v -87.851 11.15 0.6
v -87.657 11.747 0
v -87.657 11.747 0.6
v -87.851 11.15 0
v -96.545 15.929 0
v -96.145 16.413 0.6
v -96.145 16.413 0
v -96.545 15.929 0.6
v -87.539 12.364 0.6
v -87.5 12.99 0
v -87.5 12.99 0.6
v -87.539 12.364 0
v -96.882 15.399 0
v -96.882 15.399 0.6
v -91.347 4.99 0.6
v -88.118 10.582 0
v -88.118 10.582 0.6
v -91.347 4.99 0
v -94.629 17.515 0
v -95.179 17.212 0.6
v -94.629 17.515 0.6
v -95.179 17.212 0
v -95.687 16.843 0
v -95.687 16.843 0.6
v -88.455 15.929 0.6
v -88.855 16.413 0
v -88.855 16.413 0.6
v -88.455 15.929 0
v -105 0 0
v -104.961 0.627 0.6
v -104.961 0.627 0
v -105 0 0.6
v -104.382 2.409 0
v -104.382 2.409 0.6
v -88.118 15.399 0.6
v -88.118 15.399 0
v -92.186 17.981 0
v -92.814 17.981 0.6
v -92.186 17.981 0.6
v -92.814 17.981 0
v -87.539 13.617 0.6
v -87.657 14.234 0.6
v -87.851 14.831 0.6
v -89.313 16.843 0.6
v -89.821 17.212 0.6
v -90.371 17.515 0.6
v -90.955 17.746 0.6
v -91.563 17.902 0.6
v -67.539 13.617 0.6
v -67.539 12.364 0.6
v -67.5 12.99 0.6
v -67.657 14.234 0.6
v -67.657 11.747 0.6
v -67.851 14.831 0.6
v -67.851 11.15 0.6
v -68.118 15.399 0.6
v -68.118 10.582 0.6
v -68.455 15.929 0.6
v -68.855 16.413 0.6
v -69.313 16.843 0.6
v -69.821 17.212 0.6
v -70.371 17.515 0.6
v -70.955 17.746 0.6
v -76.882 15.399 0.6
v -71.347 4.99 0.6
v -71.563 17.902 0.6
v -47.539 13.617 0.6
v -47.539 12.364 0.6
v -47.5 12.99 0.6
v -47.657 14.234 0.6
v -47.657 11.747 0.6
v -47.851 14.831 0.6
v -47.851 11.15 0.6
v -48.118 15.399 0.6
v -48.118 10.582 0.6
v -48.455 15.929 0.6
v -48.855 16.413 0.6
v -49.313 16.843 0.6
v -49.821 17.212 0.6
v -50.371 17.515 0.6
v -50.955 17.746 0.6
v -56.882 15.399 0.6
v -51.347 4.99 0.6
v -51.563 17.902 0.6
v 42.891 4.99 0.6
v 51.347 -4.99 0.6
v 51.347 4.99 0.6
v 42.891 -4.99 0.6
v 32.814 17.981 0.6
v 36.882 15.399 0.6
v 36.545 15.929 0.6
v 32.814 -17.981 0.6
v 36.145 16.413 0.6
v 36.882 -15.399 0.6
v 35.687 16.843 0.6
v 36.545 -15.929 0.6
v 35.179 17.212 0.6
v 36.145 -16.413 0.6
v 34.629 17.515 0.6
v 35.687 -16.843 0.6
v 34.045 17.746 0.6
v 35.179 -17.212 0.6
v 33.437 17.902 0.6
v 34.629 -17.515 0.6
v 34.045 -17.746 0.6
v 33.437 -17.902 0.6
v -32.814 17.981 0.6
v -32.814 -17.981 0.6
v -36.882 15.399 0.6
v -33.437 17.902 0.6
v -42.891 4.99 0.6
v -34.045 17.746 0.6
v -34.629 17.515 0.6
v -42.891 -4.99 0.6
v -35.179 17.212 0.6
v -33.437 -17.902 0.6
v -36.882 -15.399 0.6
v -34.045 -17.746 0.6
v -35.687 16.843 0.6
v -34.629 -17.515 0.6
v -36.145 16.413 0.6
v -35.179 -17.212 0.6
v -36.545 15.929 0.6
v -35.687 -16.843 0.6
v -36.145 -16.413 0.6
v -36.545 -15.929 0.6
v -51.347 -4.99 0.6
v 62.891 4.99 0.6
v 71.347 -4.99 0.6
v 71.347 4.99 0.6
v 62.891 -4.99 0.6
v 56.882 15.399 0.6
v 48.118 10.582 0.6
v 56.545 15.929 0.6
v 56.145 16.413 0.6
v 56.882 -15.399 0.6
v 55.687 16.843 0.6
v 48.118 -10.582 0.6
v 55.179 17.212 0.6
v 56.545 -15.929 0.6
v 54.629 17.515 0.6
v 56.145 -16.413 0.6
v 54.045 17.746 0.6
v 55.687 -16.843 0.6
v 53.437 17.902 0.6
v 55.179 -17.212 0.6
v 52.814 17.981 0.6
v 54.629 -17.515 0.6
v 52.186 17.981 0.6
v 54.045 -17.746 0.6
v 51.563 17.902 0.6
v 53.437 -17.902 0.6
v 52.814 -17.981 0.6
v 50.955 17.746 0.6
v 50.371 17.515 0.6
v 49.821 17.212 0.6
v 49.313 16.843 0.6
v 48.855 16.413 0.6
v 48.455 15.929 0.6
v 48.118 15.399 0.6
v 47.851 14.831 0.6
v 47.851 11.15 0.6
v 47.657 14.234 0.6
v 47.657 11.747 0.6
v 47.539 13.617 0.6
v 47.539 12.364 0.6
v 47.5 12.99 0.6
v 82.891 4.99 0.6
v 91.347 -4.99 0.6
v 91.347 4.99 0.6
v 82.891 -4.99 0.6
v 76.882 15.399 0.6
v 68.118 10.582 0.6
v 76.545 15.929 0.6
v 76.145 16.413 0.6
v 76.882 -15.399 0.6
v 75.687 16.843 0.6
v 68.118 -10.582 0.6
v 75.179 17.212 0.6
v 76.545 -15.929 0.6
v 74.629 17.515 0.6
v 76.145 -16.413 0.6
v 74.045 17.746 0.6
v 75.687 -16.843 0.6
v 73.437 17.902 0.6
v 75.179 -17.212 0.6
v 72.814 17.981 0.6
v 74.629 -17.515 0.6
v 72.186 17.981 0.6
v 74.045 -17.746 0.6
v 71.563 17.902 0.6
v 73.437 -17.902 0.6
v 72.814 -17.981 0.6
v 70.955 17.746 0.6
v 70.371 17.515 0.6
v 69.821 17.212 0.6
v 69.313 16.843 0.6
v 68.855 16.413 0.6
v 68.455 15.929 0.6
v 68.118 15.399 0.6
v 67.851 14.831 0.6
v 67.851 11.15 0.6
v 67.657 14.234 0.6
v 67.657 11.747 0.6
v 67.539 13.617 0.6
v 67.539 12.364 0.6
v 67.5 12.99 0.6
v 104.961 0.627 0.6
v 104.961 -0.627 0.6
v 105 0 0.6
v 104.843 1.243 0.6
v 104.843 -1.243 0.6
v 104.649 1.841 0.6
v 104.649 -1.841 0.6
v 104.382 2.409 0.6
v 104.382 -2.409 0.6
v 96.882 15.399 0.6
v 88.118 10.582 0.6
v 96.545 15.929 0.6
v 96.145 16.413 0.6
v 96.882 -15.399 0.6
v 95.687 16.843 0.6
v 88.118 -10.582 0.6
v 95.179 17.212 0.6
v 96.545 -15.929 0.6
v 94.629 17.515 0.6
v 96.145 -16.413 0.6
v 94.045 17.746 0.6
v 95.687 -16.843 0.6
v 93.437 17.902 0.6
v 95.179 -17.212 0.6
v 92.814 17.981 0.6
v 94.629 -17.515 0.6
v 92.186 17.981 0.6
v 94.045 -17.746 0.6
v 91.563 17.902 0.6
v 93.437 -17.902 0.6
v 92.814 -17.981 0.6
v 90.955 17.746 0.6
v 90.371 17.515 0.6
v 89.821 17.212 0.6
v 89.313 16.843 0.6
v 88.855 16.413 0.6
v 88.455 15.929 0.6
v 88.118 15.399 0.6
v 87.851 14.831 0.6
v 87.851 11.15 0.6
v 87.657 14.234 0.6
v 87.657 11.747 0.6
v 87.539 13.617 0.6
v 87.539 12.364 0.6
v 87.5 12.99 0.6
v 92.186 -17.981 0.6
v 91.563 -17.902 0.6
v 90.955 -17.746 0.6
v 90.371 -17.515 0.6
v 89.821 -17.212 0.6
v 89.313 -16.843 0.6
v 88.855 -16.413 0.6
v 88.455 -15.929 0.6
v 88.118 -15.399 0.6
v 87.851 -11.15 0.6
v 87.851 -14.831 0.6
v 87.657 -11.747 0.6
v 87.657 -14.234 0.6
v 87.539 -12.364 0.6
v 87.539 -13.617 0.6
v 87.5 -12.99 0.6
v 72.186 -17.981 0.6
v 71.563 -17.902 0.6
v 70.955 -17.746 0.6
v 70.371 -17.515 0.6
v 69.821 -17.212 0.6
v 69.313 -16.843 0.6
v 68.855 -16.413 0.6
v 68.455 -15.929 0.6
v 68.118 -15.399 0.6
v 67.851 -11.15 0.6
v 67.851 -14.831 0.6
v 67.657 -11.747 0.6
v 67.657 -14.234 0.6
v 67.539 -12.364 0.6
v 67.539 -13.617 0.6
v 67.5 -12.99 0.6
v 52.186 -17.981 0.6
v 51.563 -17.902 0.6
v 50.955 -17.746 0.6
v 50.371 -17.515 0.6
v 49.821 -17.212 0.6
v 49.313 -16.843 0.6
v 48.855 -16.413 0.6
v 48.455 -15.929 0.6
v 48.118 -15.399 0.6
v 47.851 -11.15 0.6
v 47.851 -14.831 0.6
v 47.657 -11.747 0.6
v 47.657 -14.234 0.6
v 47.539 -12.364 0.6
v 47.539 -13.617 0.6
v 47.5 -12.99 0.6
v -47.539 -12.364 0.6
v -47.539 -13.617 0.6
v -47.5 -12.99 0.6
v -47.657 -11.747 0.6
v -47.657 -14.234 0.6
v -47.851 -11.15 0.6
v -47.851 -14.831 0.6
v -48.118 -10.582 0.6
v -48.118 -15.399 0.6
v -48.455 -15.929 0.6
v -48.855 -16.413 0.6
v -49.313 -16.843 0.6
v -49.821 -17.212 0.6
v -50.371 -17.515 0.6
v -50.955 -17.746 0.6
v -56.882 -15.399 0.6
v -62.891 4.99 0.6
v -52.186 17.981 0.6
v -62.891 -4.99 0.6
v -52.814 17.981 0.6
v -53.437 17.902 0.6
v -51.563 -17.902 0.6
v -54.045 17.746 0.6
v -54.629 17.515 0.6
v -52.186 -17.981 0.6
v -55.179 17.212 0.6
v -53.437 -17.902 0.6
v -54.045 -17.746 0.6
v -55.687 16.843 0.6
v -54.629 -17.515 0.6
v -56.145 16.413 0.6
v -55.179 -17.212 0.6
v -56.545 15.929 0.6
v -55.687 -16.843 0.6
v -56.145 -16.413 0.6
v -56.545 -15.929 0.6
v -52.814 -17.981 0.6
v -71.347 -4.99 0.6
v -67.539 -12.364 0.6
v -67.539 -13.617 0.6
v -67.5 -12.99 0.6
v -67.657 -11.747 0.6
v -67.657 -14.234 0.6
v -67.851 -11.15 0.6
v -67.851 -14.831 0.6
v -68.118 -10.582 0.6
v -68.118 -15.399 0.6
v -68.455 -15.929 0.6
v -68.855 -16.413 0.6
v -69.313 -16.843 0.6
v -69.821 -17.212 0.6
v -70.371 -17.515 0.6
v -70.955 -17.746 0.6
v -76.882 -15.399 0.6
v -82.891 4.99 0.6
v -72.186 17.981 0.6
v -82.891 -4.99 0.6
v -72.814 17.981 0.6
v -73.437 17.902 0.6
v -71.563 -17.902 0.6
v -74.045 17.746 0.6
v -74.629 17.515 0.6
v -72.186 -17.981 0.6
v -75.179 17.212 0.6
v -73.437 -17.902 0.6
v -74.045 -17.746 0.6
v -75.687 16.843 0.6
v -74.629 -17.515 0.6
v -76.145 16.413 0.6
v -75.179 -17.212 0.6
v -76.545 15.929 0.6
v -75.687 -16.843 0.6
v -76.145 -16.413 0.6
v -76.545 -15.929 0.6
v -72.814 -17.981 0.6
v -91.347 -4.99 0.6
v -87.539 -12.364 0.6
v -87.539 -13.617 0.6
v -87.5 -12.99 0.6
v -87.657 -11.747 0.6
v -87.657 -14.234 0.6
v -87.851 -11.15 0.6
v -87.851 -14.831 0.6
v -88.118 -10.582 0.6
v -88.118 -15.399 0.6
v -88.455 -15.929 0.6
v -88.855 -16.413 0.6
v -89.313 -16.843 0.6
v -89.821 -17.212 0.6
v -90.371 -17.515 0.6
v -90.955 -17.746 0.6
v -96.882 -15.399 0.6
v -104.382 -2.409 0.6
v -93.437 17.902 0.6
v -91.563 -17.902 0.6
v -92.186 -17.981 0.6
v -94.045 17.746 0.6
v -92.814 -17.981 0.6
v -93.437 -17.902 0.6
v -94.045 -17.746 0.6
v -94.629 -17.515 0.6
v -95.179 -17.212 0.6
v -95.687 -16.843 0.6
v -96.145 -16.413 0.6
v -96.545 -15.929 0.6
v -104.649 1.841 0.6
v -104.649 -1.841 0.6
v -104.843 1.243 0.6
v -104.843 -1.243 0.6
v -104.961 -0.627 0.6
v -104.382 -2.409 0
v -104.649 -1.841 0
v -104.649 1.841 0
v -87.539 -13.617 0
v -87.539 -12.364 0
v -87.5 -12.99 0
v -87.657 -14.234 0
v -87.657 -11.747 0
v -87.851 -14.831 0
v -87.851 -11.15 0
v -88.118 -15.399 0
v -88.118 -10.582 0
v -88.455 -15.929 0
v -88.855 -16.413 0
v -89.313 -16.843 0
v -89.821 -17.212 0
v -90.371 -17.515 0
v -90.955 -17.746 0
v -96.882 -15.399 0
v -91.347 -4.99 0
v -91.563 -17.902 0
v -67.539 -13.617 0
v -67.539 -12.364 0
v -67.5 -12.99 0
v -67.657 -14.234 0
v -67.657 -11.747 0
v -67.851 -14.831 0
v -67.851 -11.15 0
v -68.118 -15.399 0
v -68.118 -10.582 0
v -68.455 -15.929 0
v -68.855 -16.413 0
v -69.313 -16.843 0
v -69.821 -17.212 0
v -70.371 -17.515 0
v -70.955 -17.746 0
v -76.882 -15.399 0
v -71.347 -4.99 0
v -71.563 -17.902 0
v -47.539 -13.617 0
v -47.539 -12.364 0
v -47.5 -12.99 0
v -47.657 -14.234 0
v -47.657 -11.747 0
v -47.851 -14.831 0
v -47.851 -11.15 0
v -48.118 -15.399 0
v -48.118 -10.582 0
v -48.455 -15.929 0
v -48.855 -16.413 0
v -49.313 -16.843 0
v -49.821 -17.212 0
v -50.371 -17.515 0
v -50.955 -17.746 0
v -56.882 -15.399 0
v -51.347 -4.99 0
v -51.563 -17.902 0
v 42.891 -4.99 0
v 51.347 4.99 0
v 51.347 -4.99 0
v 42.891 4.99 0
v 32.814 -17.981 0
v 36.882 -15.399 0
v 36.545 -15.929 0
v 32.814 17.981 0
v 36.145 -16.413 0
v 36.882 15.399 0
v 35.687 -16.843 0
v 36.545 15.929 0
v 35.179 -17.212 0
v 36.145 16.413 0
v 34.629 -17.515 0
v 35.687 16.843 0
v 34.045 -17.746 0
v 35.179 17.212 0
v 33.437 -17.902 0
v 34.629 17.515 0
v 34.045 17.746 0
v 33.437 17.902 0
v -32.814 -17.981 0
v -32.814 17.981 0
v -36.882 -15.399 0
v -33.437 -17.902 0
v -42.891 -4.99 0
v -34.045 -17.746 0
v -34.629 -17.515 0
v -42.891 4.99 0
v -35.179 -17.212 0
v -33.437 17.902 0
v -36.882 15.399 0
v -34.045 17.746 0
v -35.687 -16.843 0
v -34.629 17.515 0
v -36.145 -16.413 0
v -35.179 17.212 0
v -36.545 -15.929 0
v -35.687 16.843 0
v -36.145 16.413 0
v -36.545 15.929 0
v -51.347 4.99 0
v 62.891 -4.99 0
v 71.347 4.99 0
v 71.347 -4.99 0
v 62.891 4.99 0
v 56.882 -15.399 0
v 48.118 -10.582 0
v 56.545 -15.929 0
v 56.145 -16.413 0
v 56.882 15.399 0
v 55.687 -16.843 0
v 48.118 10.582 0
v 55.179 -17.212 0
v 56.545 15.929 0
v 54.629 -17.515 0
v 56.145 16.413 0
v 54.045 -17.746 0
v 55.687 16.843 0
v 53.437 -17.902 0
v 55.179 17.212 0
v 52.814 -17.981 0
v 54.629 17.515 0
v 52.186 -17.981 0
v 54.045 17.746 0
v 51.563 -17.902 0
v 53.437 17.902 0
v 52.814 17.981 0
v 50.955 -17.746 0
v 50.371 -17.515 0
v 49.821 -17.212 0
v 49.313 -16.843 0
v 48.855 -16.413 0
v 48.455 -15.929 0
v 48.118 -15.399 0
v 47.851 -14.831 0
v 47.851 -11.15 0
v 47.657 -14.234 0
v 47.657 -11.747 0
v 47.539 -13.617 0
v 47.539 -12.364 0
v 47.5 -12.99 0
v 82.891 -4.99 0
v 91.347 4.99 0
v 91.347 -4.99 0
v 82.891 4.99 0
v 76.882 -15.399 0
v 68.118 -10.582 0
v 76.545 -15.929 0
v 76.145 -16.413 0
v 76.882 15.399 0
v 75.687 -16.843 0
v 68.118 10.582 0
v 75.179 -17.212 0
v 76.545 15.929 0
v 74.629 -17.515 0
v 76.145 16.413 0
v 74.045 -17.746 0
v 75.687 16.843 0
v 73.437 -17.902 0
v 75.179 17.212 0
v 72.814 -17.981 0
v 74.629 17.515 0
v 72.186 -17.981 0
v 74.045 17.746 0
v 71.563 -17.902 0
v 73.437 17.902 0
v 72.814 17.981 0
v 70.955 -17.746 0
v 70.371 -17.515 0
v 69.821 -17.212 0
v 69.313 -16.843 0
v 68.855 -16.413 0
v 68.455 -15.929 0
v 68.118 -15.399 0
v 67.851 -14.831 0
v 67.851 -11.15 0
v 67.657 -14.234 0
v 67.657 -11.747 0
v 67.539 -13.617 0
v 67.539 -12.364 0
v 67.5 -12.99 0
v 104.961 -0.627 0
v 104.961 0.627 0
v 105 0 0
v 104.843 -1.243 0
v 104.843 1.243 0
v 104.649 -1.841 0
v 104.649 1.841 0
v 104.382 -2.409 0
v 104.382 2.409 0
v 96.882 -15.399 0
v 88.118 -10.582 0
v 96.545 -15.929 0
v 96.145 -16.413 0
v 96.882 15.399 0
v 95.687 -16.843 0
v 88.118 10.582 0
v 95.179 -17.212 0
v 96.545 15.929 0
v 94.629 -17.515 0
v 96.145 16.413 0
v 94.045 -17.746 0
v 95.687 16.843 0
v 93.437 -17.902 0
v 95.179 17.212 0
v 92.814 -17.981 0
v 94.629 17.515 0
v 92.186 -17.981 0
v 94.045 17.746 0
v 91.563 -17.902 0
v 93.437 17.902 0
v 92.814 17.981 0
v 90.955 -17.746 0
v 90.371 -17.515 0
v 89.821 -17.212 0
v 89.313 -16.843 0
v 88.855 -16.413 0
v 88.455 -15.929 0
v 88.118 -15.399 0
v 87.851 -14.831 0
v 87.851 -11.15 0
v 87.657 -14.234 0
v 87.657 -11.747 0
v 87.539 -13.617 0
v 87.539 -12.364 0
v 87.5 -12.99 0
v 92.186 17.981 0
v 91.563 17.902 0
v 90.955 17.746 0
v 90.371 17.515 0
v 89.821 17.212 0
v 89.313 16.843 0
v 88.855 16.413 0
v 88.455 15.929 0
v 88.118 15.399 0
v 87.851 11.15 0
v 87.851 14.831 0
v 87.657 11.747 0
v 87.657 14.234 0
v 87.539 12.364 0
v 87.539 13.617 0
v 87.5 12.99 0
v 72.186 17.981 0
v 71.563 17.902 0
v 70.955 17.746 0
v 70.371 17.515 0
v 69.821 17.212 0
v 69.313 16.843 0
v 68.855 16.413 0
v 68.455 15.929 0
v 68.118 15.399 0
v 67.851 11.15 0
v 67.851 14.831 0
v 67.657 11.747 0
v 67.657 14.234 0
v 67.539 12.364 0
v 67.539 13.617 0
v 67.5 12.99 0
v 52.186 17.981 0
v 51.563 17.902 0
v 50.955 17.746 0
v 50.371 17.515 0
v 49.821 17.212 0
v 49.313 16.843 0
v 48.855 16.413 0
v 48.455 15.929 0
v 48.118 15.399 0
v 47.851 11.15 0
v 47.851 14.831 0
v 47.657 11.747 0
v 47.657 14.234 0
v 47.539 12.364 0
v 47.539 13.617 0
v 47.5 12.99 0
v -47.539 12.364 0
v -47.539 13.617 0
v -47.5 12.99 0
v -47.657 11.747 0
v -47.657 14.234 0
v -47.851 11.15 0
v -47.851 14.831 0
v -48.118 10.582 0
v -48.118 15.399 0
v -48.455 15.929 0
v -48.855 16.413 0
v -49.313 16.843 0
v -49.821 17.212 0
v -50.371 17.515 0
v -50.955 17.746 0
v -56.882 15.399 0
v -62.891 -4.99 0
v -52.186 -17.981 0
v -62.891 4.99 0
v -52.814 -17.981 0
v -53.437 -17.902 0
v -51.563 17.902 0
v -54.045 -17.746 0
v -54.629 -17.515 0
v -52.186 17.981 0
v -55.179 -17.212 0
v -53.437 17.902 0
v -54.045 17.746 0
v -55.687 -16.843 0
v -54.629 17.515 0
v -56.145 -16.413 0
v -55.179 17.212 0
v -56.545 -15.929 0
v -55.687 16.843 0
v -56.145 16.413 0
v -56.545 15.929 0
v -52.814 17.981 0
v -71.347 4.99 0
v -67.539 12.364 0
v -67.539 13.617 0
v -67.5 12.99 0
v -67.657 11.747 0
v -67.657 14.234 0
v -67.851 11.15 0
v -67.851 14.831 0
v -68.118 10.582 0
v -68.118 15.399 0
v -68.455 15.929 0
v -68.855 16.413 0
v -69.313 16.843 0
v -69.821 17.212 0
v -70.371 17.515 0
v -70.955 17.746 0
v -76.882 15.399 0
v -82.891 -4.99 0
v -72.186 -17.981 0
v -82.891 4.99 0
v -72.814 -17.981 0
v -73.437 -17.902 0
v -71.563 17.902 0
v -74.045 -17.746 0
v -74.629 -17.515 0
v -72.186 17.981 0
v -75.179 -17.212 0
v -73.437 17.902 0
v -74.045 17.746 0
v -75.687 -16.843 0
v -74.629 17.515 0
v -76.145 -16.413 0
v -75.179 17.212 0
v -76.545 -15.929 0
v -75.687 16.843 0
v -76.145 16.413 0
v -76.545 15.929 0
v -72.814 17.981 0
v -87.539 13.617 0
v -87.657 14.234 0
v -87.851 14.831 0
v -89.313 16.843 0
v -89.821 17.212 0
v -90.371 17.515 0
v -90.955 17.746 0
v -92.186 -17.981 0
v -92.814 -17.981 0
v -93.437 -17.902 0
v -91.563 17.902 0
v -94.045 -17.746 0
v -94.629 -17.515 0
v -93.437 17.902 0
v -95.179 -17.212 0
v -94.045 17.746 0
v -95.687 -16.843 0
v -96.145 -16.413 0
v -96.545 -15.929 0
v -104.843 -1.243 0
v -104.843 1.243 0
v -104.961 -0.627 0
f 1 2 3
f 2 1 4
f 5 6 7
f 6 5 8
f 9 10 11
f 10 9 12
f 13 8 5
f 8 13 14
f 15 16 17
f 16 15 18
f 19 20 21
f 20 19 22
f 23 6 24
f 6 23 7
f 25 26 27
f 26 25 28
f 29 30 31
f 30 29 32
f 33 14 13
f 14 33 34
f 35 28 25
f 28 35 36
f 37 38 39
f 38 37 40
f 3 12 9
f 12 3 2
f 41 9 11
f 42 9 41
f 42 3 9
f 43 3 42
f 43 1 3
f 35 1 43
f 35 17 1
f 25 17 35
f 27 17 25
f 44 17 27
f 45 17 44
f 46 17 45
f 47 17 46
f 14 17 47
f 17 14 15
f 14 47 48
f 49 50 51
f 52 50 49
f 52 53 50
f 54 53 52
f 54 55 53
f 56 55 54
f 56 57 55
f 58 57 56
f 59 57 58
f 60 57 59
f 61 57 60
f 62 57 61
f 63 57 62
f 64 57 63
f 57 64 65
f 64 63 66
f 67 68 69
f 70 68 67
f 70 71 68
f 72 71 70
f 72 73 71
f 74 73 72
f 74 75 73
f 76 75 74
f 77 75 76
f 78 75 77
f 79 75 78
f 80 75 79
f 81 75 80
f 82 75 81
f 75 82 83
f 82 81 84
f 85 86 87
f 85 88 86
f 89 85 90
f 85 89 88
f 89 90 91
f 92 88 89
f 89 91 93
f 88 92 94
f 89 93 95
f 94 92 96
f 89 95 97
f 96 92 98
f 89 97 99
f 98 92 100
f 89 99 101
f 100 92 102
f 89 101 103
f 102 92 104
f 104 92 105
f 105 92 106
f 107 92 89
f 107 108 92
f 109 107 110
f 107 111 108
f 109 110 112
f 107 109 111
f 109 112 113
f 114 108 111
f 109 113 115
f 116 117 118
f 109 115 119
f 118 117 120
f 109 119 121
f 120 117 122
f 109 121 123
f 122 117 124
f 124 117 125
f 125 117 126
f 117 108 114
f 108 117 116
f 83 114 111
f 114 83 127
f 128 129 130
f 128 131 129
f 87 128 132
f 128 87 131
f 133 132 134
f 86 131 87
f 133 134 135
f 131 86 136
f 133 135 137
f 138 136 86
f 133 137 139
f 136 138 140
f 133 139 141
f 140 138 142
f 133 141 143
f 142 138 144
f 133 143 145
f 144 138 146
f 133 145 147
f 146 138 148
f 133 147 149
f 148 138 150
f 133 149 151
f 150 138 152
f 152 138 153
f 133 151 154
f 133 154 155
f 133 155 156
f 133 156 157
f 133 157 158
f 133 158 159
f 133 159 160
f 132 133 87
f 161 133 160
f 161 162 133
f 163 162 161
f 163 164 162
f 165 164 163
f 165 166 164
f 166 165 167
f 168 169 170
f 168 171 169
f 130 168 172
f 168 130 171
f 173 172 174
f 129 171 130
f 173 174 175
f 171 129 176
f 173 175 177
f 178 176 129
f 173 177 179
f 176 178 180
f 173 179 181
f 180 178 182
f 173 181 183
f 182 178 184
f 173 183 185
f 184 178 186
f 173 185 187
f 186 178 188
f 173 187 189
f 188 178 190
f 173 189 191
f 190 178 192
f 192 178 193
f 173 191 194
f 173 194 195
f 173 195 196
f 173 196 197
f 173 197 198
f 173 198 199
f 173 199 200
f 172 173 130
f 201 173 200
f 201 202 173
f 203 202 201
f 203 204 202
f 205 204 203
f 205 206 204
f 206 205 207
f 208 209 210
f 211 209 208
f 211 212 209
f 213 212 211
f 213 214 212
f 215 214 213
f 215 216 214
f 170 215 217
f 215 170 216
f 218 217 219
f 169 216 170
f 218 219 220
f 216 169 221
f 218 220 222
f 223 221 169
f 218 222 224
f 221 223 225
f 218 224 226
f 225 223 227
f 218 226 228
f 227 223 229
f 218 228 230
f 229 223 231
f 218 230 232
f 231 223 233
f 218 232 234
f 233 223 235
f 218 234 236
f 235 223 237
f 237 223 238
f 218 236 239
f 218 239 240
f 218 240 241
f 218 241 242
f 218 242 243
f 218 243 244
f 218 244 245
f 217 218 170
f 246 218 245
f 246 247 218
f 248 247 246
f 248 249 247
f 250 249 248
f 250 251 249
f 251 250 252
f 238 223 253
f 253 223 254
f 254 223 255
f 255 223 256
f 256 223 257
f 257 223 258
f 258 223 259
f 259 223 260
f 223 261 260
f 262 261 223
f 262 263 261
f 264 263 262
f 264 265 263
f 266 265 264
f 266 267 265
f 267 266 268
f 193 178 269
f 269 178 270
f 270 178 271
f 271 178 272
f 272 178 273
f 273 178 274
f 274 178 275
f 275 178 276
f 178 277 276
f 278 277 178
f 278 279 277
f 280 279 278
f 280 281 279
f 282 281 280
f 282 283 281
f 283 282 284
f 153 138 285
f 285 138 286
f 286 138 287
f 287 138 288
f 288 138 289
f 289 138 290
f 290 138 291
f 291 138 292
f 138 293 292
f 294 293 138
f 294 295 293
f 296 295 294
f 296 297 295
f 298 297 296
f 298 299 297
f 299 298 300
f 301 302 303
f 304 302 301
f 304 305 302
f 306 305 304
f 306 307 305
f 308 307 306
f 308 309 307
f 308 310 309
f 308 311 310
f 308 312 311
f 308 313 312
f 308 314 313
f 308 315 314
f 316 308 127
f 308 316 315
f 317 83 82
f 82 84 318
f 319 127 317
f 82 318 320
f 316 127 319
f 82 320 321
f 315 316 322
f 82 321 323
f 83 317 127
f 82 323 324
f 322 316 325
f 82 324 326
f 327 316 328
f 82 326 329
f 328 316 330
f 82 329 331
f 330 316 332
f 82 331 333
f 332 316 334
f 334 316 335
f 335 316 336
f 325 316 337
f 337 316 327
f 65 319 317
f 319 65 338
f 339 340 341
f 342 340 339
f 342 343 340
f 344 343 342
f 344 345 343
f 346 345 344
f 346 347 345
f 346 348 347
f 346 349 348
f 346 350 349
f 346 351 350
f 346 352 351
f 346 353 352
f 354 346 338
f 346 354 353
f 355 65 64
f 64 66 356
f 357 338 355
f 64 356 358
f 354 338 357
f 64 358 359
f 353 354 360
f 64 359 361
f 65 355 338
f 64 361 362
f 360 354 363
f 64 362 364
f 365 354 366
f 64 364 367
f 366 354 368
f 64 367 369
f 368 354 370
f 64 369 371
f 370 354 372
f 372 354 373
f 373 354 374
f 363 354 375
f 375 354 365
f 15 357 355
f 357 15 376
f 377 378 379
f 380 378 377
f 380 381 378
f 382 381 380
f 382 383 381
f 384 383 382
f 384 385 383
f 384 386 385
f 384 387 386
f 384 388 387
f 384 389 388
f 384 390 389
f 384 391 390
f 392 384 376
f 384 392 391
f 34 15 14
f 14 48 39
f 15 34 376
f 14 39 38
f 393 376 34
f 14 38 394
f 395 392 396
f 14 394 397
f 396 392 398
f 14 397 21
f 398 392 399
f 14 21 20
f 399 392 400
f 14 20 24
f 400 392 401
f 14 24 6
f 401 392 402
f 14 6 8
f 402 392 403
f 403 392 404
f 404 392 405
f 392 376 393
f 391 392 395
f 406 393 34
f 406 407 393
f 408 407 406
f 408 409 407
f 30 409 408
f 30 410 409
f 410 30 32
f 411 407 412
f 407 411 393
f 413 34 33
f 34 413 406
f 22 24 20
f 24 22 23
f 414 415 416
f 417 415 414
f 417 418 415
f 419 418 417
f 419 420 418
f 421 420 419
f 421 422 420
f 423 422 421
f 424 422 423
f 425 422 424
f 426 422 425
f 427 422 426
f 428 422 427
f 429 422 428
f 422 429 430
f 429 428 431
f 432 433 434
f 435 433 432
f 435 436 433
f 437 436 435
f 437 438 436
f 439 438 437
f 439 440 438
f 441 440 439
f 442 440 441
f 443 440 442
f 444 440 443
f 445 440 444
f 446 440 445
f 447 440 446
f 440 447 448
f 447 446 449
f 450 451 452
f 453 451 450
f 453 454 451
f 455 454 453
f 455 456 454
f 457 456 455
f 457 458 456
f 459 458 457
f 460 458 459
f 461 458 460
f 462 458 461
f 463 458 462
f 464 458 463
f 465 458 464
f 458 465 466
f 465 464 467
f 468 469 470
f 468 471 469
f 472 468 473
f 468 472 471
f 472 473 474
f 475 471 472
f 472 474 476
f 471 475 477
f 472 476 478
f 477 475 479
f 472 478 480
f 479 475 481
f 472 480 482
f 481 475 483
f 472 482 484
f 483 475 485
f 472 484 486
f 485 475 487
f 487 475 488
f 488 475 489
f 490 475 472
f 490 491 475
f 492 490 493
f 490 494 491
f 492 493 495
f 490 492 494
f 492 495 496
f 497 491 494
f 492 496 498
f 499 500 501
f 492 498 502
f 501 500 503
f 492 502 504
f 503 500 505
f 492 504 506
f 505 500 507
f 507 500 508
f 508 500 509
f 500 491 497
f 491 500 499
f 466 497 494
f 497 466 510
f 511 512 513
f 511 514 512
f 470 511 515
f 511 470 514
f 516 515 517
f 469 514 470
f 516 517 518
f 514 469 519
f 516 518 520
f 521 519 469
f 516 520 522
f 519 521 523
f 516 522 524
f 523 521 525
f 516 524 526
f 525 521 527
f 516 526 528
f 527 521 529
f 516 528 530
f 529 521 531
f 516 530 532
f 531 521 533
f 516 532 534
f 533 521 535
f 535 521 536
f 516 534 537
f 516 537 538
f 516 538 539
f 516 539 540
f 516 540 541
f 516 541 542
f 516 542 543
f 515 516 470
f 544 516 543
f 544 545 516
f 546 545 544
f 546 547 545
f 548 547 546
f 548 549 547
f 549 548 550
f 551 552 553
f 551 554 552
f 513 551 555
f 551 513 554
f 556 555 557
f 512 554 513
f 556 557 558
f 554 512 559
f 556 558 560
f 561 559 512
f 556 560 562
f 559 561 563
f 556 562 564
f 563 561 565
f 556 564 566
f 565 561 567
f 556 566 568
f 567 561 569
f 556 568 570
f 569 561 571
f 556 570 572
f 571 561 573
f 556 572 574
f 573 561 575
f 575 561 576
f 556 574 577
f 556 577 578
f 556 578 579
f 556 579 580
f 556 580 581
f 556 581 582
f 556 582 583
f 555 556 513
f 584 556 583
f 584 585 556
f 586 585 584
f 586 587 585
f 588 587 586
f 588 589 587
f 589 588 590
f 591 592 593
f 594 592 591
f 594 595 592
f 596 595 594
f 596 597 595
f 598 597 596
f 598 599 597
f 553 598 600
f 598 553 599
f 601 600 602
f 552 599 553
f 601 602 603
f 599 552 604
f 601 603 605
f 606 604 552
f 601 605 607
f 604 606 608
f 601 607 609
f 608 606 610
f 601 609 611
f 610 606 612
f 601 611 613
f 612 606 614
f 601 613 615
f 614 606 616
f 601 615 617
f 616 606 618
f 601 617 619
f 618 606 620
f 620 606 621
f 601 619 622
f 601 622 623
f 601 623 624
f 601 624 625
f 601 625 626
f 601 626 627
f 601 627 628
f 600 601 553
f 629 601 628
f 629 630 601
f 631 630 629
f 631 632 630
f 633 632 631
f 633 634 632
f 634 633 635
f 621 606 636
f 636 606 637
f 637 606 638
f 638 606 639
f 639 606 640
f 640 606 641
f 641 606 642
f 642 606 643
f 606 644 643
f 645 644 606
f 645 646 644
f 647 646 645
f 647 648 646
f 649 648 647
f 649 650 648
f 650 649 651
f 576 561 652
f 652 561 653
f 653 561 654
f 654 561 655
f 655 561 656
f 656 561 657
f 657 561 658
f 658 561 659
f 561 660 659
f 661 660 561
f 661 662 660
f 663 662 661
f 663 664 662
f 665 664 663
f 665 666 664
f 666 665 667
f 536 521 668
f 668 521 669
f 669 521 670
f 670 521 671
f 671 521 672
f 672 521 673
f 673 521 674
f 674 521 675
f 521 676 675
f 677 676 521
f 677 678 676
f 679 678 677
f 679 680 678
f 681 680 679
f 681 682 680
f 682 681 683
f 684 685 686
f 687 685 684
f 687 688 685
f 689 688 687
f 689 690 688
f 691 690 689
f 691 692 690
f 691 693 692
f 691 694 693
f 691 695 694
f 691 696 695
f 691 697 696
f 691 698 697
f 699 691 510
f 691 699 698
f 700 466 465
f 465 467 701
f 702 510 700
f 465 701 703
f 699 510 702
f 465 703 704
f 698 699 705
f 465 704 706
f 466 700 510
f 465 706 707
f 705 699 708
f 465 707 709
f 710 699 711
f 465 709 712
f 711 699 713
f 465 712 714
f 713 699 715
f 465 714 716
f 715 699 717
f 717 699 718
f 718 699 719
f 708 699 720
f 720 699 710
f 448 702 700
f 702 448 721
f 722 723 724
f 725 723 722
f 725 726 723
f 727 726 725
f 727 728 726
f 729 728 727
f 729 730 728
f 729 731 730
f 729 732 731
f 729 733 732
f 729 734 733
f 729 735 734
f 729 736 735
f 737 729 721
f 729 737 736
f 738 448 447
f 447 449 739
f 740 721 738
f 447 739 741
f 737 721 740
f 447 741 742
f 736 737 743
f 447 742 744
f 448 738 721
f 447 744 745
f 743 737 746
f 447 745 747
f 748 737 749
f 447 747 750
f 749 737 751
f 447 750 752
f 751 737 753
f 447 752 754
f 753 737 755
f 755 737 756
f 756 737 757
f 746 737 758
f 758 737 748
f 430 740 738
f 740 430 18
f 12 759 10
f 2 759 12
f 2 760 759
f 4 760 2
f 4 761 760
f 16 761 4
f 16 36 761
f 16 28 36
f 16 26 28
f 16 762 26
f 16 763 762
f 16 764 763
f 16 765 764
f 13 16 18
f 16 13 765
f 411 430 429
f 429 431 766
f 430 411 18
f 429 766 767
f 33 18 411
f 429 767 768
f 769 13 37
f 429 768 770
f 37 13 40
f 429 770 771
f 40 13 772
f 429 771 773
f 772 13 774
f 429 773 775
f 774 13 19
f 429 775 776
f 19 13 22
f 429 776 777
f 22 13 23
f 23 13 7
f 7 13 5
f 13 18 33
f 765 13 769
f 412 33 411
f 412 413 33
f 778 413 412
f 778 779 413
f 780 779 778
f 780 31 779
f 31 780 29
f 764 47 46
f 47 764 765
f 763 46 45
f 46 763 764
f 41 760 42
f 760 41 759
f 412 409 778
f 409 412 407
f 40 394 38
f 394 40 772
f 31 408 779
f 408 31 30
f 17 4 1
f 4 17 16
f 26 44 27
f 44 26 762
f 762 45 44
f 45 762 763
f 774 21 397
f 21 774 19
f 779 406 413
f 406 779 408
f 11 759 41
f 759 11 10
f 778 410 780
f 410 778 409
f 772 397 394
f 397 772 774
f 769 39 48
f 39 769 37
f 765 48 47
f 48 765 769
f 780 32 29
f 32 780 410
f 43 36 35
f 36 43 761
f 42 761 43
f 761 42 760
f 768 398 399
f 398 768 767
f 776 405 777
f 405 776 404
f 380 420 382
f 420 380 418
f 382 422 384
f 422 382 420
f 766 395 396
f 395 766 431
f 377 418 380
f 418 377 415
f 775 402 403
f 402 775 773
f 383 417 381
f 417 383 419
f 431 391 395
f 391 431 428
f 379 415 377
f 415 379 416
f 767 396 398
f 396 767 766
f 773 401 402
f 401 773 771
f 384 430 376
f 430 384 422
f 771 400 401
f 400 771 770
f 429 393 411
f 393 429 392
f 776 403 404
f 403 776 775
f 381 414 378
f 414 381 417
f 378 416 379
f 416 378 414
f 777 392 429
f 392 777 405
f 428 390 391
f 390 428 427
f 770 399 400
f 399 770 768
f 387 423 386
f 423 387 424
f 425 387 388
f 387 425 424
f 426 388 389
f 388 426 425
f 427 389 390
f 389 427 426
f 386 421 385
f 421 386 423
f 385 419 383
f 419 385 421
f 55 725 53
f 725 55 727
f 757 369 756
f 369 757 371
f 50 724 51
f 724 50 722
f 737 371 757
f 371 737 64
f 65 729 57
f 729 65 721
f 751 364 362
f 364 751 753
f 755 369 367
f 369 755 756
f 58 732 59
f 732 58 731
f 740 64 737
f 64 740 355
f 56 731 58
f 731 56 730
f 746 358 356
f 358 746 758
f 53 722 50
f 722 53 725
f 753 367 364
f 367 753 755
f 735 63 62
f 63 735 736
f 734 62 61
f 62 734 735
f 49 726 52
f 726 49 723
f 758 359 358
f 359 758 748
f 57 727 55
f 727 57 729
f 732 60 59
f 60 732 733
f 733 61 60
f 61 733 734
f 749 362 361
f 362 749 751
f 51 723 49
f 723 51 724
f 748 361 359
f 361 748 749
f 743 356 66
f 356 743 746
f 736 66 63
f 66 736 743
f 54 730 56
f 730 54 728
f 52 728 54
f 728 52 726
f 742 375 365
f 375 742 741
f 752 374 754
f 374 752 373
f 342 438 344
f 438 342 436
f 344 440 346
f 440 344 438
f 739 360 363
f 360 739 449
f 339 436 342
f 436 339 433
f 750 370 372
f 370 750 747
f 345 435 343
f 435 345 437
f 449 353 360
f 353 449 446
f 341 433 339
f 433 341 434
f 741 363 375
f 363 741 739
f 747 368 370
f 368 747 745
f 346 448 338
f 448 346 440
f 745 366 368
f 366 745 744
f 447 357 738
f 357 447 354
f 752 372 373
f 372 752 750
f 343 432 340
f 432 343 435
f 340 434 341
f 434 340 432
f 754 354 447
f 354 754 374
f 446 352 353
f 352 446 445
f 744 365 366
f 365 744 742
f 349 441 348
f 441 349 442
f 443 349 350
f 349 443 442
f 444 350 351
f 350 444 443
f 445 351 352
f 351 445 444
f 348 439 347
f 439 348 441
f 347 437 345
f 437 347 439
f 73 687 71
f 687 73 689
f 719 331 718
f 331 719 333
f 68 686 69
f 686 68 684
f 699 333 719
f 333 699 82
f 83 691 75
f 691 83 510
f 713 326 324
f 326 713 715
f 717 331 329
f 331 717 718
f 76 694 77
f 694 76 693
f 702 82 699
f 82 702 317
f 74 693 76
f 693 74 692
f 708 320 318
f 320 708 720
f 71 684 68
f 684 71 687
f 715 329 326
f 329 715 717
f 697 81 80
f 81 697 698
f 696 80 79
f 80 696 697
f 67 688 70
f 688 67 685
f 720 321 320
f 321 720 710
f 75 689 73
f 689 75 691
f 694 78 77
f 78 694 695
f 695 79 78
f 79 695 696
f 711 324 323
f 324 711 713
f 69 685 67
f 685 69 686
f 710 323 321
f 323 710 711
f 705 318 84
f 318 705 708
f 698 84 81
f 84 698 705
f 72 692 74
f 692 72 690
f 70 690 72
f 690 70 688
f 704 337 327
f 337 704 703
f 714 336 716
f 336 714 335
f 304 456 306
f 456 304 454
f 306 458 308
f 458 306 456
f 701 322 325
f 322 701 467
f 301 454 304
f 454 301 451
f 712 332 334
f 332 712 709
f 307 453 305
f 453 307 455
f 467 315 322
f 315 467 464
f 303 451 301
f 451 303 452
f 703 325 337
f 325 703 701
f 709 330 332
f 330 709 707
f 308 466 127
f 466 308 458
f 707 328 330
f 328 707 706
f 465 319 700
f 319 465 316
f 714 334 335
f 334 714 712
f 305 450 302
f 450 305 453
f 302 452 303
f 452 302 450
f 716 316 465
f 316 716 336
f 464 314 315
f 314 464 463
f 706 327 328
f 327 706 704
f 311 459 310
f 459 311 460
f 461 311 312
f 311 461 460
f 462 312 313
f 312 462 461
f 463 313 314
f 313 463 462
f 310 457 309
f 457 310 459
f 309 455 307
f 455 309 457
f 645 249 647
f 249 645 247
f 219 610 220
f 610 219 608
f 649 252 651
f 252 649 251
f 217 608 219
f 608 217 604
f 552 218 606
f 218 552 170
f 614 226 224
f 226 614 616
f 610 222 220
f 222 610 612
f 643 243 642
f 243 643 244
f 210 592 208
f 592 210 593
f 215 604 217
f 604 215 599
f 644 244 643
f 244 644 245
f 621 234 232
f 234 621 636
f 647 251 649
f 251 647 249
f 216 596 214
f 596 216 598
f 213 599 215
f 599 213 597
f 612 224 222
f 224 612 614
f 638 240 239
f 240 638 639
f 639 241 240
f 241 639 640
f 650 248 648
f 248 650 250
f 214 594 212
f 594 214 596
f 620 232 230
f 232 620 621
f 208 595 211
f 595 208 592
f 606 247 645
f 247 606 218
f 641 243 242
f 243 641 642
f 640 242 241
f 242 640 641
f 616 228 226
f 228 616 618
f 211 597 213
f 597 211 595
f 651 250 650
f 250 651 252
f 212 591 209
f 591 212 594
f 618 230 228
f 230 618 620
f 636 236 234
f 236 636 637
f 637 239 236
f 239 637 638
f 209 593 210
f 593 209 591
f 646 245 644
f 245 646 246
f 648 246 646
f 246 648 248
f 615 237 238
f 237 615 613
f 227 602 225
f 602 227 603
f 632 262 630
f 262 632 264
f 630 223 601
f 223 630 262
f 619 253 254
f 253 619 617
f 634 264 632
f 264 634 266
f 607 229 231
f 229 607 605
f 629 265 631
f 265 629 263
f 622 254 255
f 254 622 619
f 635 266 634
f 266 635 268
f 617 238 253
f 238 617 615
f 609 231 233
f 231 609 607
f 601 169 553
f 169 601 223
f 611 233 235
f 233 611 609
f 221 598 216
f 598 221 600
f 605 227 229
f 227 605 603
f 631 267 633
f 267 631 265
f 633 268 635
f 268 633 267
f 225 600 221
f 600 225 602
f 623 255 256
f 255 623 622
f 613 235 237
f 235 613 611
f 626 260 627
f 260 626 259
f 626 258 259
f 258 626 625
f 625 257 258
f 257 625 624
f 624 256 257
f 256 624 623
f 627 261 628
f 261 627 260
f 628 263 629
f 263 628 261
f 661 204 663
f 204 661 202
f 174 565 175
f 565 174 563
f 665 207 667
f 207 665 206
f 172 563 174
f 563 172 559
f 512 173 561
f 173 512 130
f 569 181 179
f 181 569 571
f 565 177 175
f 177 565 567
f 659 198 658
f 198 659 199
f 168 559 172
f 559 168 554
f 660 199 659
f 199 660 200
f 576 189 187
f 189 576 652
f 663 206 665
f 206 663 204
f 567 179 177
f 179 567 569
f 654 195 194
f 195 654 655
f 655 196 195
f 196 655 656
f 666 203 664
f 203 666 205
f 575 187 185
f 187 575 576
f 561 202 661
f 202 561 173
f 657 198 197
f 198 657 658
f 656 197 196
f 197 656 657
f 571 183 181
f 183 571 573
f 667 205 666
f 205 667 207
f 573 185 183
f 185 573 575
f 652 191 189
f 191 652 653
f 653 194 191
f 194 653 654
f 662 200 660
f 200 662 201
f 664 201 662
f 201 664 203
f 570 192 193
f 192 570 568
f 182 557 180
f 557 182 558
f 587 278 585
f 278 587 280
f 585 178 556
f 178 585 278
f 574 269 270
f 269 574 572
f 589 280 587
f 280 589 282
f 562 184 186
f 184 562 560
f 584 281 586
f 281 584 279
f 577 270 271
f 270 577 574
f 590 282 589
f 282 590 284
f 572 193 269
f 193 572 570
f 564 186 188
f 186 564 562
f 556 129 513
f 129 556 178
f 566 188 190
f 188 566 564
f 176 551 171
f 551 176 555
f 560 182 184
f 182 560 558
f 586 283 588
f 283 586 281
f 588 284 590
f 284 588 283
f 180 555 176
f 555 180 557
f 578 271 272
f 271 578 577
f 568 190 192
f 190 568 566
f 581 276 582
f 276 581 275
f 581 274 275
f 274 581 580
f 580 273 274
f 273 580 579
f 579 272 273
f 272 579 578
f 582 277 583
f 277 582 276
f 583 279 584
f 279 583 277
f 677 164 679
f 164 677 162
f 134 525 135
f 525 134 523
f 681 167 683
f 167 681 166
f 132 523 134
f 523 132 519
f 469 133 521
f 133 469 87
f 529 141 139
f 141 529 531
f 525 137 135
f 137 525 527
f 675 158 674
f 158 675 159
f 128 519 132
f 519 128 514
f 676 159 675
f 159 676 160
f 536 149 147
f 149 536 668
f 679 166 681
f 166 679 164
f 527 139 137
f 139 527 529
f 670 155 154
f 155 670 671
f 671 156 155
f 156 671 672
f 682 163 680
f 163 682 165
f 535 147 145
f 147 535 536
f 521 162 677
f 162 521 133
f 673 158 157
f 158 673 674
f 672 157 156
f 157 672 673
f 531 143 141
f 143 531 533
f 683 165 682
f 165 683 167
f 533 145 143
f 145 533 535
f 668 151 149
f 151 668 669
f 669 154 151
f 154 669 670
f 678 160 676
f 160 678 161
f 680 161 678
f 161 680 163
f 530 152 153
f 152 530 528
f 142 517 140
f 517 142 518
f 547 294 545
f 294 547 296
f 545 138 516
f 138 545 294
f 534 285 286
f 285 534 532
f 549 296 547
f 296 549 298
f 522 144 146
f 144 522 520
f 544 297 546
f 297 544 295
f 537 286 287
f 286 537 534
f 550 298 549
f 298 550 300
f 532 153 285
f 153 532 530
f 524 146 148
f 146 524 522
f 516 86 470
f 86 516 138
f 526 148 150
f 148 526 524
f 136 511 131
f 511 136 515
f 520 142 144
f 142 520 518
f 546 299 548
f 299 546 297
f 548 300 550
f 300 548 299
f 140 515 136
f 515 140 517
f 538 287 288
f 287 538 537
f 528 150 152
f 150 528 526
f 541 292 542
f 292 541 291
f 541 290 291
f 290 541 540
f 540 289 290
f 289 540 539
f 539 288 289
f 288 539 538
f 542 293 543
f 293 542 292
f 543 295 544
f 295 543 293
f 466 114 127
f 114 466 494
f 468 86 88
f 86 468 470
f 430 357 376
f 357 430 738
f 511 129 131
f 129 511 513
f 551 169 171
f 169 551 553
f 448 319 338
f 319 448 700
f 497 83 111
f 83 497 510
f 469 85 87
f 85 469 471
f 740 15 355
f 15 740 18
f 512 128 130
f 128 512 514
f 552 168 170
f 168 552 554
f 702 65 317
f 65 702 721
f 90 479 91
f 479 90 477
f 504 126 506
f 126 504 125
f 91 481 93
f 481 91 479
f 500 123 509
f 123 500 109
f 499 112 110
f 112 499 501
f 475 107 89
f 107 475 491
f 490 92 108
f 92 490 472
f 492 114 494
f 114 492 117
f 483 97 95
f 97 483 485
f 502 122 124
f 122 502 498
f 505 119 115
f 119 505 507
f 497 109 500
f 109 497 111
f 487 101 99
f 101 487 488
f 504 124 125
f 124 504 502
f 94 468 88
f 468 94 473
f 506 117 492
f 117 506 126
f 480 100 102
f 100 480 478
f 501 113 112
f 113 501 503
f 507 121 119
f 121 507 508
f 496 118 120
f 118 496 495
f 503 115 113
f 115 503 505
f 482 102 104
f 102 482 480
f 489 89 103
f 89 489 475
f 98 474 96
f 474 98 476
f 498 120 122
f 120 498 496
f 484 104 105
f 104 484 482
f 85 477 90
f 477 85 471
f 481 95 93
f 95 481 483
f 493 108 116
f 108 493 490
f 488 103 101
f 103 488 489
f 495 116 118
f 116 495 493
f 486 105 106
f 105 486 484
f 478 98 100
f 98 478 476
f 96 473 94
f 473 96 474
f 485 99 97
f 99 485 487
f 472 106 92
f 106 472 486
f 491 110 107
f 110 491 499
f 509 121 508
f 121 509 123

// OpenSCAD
/**
 * Martin Egli
 * 2021-06-23
 * a relife strip for corona masks
 */

res = 50;

module grip01(th = 0.6, wid = 15) {
    hull() {
        translate([0, 0, 0])
        cylinder(d = 10, h = th, $fn = res);
        translate([wid*cos(60), wid*sin(60), 0])
        cylinder(d = 10, h = th, $fn = res);
    }
    hull() {
        translate([0, 0, 0])
        cylinder(d = 10, h = th, $fn = res);
        translate([wid*cos(-60), wid*sin(-60), 0])
        cylinder(d = 10, h = th, $fn = res);
    }
}

module relief01(th = 0.6) {
    hull() {
        translate([-100+5, 0, 0])
        cylinder(d = 10, h = th, $fn = res);
        translate([100-5, 0, 0])
        cylinder(d = 10, h = th, $fn = res);
    }
    translate([-100, 0, 0])
    grip01(th);
    translate([-80, 0, 0])
    grip01(th);
    translate([-60, 0, 0])
    grip01(th);
    
    hull() {
        translate([-40, 0, 0])
        grip01(th);
        translate([40, 0, 0])
        mirror([1, 0, 0])
        grip01(th);
    }
    
    translate([100, 0, 0])
    mirror([1, 0, 0])
    grip01(th);
    translate([80, 0, 0])
    mirror([1, 0, 0])
    grip01(th);
    translate([60, 0, 0])
    mirror([1, 0, 0])
    grip01(th);
    
    
}

relief01();
